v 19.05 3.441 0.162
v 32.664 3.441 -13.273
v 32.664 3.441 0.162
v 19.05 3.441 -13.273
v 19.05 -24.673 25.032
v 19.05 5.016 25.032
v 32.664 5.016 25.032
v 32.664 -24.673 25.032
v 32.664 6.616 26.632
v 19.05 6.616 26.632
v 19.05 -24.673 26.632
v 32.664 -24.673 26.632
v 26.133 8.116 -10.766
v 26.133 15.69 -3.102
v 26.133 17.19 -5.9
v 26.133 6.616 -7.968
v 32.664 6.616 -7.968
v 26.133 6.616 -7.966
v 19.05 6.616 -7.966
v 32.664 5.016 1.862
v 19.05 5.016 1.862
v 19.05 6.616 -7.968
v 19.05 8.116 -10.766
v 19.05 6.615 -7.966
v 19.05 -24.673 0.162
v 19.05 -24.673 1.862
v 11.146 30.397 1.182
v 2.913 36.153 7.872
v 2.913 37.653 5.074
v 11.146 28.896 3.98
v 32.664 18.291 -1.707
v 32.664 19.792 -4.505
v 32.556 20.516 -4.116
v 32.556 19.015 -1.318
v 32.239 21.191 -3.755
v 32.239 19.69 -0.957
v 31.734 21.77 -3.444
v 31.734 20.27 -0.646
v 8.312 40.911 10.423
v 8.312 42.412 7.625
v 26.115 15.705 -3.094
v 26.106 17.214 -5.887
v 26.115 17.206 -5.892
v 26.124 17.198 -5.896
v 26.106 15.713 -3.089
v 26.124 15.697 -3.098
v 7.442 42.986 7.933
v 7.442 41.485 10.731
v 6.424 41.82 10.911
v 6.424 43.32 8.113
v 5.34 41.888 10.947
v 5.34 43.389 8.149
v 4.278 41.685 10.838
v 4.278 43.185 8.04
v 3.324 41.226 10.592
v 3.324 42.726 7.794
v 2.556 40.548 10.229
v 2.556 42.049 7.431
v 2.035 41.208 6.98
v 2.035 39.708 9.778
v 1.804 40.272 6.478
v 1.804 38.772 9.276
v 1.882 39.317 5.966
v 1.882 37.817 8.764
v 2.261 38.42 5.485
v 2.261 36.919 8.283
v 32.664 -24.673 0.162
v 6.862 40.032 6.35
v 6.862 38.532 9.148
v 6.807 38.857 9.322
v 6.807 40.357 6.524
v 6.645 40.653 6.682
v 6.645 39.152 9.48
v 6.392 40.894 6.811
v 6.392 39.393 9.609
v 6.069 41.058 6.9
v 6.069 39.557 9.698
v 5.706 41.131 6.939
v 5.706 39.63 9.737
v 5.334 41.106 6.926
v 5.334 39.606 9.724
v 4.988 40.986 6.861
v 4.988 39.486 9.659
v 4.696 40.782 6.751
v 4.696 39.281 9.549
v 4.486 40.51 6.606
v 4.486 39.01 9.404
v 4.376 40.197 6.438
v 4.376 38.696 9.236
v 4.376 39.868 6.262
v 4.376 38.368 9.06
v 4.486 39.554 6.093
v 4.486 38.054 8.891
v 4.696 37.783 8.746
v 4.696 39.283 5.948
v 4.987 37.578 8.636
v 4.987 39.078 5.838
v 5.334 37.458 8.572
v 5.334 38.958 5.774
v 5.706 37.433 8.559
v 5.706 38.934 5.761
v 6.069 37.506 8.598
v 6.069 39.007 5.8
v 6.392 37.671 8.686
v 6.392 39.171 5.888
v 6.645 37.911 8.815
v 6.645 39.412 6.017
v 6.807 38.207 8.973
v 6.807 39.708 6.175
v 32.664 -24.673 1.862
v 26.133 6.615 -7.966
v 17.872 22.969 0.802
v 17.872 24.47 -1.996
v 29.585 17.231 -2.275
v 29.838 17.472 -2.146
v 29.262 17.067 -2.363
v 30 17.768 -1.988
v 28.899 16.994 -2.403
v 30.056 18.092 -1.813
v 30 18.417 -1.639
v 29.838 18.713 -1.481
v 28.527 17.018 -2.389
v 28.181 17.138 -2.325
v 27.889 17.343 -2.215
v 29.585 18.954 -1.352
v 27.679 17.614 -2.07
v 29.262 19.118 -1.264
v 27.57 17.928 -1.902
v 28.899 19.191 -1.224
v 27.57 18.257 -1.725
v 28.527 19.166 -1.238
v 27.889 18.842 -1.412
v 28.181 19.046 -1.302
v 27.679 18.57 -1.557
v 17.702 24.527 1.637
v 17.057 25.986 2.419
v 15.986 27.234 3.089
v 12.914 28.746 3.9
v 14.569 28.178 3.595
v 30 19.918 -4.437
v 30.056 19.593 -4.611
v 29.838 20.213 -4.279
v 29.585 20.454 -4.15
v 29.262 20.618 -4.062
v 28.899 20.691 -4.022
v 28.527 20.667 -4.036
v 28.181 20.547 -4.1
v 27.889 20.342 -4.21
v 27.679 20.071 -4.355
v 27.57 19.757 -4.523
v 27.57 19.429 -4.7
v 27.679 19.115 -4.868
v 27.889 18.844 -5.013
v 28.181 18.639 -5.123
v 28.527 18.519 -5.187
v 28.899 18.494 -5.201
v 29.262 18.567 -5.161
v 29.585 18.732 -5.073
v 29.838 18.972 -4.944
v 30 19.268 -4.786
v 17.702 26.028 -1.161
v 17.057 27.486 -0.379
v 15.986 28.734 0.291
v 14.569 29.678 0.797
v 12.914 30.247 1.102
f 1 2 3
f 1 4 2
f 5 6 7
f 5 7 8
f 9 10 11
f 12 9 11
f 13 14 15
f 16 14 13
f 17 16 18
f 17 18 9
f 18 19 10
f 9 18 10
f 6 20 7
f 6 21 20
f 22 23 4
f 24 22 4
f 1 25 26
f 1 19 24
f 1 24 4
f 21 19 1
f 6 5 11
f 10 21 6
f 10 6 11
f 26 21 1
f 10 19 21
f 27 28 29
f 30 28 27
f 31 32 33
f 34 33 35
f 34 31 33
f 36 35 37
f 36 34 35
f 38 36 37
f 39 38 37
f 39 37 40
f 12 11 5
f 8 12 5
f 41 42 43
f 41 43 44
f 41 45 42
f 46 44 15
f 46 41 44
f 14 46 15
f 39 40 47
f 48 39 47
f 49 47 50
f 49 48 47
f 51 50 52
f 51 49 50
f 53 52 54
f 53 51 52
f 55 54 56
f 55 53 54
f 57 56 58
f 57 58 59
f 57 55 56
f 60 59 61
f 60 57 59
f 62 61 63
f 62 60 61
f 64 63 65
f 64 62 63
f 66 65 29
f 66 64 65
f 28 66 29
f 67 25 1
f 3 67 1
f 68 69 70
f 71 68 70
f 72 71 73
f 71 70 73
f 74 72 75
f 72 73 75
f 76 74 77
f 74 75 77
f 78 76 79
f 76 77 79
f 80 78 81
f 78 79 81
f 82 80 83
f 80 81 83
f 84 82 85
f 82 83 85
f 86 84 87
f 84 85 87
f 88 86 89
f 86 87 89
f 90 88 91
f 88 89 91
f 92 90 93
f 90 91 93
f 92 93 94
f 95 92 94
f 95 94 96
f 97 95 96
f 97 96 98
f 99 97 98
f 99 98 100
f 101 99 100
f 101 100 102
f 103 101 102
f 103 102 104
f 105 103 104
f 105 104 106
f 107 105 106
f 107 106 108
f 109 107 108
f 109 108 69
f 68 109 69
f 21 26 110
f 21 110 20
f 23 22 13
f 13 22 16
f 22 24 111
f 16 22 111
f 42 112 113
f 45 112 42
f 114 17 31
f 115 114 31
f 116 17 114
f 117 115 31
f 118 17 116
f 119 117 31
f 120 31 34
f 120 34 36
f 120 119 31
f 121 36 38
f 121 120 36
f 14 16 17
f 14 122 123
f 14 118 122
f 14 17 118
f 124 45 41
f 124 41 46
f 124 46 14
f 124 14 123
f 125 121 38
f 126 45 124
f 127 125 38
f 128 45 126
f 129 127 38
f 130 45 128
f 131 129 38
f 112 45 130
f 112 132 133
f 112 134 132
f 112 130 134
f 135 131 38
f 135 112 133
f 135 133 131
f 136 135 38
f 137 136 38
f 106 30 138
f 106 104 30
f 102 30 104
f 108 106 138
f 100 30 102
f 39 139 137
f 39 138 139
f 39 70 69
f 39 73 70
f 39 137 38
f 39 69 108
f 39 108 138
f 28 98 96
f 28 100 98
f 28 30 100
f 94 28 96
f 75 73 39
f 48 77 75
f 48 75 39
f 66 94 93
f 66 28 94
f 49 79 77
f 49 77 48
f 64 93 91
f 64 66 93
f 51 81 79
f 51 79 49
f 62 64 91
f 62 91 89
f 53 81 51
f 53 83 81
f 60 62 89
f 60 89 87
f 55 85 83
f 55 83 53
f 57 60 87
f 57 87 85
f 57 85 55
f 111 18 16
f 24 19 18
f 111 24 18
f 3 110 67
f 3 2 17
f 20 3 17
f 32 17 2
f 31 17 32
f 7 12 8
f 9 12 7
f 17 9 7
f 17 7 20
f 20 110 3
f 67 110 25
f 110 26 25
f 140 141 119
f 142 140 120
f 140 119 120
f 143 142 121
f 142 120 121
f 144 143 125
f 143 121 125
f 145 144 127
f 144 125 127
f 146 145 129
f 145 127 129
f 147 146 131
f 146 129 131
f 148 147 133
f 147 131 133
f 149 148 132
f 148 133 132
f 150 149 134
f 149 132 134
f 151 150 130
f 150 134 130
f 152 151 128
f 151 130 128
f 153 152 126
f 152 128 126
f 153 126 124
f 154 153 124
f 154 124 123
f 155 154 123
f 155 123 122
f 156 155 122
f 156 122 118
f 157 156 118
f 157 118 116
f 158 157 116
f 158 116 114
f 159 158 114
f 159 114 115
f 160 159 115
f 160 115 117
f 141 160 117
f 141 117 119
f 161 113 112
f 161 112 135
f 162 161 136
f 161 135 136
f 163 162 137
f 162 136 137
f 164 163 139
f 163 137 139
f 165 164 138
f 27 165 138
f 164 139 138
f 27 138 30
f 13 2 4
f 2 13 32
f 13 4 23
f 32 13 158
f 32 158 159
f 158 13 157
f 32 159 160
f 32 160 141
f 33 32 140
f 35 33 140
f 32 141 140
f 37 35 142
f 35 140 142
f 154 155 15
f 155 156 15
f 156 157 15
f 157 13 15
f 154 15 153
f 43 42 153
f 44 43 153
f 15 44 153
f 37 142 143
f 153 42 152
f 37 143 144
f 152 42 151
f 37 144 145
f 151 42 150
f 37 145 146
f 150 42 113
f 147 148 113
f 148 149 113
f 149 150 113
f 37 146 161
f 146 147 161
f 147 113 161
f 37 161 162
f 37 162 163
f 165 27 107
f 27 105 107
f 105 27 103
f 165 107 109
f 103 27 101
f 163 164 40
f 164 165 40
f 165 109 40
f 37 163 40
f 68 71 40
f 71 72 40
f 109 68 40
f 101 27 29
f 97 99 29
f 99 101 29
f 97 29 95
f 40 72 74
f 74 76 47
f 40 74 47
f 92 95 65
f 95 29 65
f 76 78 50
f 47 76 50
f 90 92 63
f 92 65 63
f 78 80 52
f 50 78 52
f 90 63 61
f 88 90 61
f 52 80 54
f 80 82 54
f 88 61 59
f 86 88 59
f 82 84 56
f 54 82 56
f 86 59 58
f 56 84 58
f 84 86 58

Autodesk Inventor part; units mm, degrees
ref_plane "YZ Plane" through (0, 0, 0) normal (1, 0, 0) x (0, 1, 0)
ref_plane "XZ Plane" through (0, 0, 0) normal (0, 1, 0) x (-1, 0, 0)
ref_plane "XY Plane" through (0, 0, 0) normal (0, 0, 1) x (1, 0, 0)
sketch "Sketch1" plane through (0, 0, 0) normal (1, 0, 0) x (0, 1, 0)
  line L0 (6.6158, 26.6317) -> (-24.673, 26.6317)
  line L1 (6.6158, 0.5934) -> (6.6158, 26.6317)
  line L2 (5.0158, 25.0317) -> (-24.673, 25.0317)
  line L3 (-24.673, 1.8624) -> (5.0158, 1.8624)
  line L4 (5.0158, 1.8624) -> (5.0158, 25.0317)
  line L5 (-24.673, 26.6317) -> (-24.673, 25.0317)
  line L6 (-24.673, 1.8624) -> (-24.673, 0.1625)
  line L7 (-24.6286, 24.997) -> (4.9714, 24.997) construction
  line L8 (4.9714, 24.997) -> (4.9714, 1.897) construction
  line L9 (4.9714, 1.897) -> (-24.6286, 1.897) construction
  line L10 (-24.6286, 1.897) -> (-24.6286, 24.997) construction
  line L11 (-24.6286, 1.897) -> (-24.6286, 1.8624) construction
  line L12 (-24.6286, 24.997) -> (-24.6286, 25.0317) construction
  line L13 (4.9714, 2.1686) -> (16.2714, -18.903) construction
  line L14 (4.0247, -13.8964) -> (20.8987, -4.8474)
  line L15 (3.4408, -13.2733) -> (44.9775, 9.0015)
  line L16 (3.4408, -13.2733) -> (3.4408, 0.1625)
  line L17 (6.6158, 0.5934) -> (6.6158, -7.968)
  line L18 (6.6158, -7.968) -> (43.477, 11.7995)
  line L19 (43.477, 11.7995) -> (44.9775, 9.0015)
  line L20 (-24.673, 0.1625) -> (3.4408, 0.1625)
  line L21 (6.6158, 13.8186) -> (15.6898, -3.1019) construction
  point P0 (0, 0)
  dimension "d2" = 1.6
  dimension "d3" = 23.1693
  dimension "d5" = 29.6888
  dimension "d6" = 29.6
  dimension "d7" = 23.1
  dimension "d8" = 0.0444
  dimension "d9" = 11.3
  dimension "d10" = 20.8
  dimension "d11" = 10.2
  dimension "d15" = 3.175
  dimension "d22" = 4
  dimension "d23" = 3.175
  dimension "d28" = 19.2
extrude "Extrusion1" add sketch "Sketch1" along normal blind 32.6644
sketch "Sketch2" plane through (0, 6.6158, -7.968) normal (0, -0.4726007, 0.8812767) x (1, 0, 0)
  circle A0 centre (17.209, 24.6192) radius 16.4
  circle A1 centre (28.8056, 13.0227) radius 1.25
  circle A2 centre (5.6125, 36.2158) radius 1.25
  line L0 (28.8056, 13.0227) -> (5.6125, 36.2158) construction
  line L1 (0, 41.827) -> (32.6644, 41.827) projected
  line L2 (0, 3.3414) -> (38.1, 3.3414) construction
  line L3 (0, 41.827) -> (0, 0) construction
  circle A3 centre (11.5522, 18.9624) radius 1.4362 construction
  line L4 (11.5522, 18.9624) -> (17.209, 24.6192) construction
  line L5 (0, 10.2963) -> (32.6644, 10.2963) construction
  line L6 (32.6644, 41.827) -> (32.6644, 0) construction
  circle A4 centre (17.209, 24.6192) radius 13.95 construction
  line L7 (28.8056, 13.0227) -> (5.6125, 36.2158) construction
  line L8 (31.7345, 15.4934) -> (8.3123, 38.9155)
  line L9 (2.9127, 33.516) -> (26.1058, 10.3229)
  arc A5 (26.1058, 10.3229) -> (26.1326, 10.2963) centre (28.8056, 13.0227) ccw
  arc A6 (8.3123, 38.9155) -> (2.9127, 33.516) centre (5.6125, 36.2158) ccw
  line L10 (32.6644, 13.2483) -> (32.6644, 0)
  line L11 (0, 0) -> (32.6644, 0) projected
  line L12 (26.1326, 10.2963) -> (26.1326, 0)
  arc A7 (32.6644, 13.2483) -> (31.7345, 15.4934) centre (29.4894, 13.2483) ccw
  line L13 (0, 0) -> (0, 41.827)
  line L14 (32.6644, -5.3054) -> (32.6644, 41.827) projected
  arc A8 (17.872, 18.5567) -> (11.1465, 25.2822) centre (11.4175, 18.8277) ccw
  point P0 (0, -2.0647)
  point P1 (0, 3.3414)
  point P2 (0, 10.2963)
  point P3 (31.1867, 16.0411)
  point P4 (32.6644, 19.1336)
  point P5 (32.6644, 13.2483)
  point P6 (15.9856, 23.3958)
  dimension "d16" = 32.8
  dimension "d17" = 2.5
  dimension "d18" = 2.5
  dimension "d19" = 45
  dimension "d26" = 8
  dimension "d27" = 15.621
  dimension "d29" = 27.9
  dimension "d30" = 3.175
extrude "Extrusion2" cut sketch "Sketch2" against normal blind 25.4 contours A2 A0 | A0 A2 | A1 A0 | A0 A1
extrude "Extrusion3" cut sketch "Sketch2" against normal blind 25.4 contours L14 A0 L8 | A0 L8 A6 L9 A5 L12 L11 L13 L1 L14 | L14 A7 L8 A0 | L9 A0 | A8 L9
sketch "Sketch5" plane through (0, 0, 0) normal (-1, 0, 0) x (0, 0, 1)
  line L0 (-7.968, 6.6158) -> (-10.766, 8.1163) projected
  line L1 (-13.2733, 3.4408) -> (-10.766, 8.1163) projected
  line L2 (0.1625, 3.4408) -> (-13.2733, 3.4408) projected
  line L3 (0.1625, -24.673) -> (0.1625, 3.4408) projected
  line L4 (1.8624, -24.673) -> (0.1625, -24.673) projected
  line L5 (1.8624, 5.0158) -> (1.8624, -24.673) projected
  line L6 (25.0317, 5.0158) -> (1.8624, 5.0158) projected
  line L7 (25.0317, -24.673) -> (25.0317, 5.0158) projected
  line L8 (26.6317, -24.673) -> (25.0317, -24.673) projected
  line L9 (26.6317, 6.6158) -> (26.6317, -24.673) projected
  line L10 (-7.968, 6.6158) -> (26.6317, 6.6158) projected
  point P0 (0, 0)
extrude "Extrusion4" cut sketch "Sketch5" against normal blind 19.05
properties part number "Motor Mount"
